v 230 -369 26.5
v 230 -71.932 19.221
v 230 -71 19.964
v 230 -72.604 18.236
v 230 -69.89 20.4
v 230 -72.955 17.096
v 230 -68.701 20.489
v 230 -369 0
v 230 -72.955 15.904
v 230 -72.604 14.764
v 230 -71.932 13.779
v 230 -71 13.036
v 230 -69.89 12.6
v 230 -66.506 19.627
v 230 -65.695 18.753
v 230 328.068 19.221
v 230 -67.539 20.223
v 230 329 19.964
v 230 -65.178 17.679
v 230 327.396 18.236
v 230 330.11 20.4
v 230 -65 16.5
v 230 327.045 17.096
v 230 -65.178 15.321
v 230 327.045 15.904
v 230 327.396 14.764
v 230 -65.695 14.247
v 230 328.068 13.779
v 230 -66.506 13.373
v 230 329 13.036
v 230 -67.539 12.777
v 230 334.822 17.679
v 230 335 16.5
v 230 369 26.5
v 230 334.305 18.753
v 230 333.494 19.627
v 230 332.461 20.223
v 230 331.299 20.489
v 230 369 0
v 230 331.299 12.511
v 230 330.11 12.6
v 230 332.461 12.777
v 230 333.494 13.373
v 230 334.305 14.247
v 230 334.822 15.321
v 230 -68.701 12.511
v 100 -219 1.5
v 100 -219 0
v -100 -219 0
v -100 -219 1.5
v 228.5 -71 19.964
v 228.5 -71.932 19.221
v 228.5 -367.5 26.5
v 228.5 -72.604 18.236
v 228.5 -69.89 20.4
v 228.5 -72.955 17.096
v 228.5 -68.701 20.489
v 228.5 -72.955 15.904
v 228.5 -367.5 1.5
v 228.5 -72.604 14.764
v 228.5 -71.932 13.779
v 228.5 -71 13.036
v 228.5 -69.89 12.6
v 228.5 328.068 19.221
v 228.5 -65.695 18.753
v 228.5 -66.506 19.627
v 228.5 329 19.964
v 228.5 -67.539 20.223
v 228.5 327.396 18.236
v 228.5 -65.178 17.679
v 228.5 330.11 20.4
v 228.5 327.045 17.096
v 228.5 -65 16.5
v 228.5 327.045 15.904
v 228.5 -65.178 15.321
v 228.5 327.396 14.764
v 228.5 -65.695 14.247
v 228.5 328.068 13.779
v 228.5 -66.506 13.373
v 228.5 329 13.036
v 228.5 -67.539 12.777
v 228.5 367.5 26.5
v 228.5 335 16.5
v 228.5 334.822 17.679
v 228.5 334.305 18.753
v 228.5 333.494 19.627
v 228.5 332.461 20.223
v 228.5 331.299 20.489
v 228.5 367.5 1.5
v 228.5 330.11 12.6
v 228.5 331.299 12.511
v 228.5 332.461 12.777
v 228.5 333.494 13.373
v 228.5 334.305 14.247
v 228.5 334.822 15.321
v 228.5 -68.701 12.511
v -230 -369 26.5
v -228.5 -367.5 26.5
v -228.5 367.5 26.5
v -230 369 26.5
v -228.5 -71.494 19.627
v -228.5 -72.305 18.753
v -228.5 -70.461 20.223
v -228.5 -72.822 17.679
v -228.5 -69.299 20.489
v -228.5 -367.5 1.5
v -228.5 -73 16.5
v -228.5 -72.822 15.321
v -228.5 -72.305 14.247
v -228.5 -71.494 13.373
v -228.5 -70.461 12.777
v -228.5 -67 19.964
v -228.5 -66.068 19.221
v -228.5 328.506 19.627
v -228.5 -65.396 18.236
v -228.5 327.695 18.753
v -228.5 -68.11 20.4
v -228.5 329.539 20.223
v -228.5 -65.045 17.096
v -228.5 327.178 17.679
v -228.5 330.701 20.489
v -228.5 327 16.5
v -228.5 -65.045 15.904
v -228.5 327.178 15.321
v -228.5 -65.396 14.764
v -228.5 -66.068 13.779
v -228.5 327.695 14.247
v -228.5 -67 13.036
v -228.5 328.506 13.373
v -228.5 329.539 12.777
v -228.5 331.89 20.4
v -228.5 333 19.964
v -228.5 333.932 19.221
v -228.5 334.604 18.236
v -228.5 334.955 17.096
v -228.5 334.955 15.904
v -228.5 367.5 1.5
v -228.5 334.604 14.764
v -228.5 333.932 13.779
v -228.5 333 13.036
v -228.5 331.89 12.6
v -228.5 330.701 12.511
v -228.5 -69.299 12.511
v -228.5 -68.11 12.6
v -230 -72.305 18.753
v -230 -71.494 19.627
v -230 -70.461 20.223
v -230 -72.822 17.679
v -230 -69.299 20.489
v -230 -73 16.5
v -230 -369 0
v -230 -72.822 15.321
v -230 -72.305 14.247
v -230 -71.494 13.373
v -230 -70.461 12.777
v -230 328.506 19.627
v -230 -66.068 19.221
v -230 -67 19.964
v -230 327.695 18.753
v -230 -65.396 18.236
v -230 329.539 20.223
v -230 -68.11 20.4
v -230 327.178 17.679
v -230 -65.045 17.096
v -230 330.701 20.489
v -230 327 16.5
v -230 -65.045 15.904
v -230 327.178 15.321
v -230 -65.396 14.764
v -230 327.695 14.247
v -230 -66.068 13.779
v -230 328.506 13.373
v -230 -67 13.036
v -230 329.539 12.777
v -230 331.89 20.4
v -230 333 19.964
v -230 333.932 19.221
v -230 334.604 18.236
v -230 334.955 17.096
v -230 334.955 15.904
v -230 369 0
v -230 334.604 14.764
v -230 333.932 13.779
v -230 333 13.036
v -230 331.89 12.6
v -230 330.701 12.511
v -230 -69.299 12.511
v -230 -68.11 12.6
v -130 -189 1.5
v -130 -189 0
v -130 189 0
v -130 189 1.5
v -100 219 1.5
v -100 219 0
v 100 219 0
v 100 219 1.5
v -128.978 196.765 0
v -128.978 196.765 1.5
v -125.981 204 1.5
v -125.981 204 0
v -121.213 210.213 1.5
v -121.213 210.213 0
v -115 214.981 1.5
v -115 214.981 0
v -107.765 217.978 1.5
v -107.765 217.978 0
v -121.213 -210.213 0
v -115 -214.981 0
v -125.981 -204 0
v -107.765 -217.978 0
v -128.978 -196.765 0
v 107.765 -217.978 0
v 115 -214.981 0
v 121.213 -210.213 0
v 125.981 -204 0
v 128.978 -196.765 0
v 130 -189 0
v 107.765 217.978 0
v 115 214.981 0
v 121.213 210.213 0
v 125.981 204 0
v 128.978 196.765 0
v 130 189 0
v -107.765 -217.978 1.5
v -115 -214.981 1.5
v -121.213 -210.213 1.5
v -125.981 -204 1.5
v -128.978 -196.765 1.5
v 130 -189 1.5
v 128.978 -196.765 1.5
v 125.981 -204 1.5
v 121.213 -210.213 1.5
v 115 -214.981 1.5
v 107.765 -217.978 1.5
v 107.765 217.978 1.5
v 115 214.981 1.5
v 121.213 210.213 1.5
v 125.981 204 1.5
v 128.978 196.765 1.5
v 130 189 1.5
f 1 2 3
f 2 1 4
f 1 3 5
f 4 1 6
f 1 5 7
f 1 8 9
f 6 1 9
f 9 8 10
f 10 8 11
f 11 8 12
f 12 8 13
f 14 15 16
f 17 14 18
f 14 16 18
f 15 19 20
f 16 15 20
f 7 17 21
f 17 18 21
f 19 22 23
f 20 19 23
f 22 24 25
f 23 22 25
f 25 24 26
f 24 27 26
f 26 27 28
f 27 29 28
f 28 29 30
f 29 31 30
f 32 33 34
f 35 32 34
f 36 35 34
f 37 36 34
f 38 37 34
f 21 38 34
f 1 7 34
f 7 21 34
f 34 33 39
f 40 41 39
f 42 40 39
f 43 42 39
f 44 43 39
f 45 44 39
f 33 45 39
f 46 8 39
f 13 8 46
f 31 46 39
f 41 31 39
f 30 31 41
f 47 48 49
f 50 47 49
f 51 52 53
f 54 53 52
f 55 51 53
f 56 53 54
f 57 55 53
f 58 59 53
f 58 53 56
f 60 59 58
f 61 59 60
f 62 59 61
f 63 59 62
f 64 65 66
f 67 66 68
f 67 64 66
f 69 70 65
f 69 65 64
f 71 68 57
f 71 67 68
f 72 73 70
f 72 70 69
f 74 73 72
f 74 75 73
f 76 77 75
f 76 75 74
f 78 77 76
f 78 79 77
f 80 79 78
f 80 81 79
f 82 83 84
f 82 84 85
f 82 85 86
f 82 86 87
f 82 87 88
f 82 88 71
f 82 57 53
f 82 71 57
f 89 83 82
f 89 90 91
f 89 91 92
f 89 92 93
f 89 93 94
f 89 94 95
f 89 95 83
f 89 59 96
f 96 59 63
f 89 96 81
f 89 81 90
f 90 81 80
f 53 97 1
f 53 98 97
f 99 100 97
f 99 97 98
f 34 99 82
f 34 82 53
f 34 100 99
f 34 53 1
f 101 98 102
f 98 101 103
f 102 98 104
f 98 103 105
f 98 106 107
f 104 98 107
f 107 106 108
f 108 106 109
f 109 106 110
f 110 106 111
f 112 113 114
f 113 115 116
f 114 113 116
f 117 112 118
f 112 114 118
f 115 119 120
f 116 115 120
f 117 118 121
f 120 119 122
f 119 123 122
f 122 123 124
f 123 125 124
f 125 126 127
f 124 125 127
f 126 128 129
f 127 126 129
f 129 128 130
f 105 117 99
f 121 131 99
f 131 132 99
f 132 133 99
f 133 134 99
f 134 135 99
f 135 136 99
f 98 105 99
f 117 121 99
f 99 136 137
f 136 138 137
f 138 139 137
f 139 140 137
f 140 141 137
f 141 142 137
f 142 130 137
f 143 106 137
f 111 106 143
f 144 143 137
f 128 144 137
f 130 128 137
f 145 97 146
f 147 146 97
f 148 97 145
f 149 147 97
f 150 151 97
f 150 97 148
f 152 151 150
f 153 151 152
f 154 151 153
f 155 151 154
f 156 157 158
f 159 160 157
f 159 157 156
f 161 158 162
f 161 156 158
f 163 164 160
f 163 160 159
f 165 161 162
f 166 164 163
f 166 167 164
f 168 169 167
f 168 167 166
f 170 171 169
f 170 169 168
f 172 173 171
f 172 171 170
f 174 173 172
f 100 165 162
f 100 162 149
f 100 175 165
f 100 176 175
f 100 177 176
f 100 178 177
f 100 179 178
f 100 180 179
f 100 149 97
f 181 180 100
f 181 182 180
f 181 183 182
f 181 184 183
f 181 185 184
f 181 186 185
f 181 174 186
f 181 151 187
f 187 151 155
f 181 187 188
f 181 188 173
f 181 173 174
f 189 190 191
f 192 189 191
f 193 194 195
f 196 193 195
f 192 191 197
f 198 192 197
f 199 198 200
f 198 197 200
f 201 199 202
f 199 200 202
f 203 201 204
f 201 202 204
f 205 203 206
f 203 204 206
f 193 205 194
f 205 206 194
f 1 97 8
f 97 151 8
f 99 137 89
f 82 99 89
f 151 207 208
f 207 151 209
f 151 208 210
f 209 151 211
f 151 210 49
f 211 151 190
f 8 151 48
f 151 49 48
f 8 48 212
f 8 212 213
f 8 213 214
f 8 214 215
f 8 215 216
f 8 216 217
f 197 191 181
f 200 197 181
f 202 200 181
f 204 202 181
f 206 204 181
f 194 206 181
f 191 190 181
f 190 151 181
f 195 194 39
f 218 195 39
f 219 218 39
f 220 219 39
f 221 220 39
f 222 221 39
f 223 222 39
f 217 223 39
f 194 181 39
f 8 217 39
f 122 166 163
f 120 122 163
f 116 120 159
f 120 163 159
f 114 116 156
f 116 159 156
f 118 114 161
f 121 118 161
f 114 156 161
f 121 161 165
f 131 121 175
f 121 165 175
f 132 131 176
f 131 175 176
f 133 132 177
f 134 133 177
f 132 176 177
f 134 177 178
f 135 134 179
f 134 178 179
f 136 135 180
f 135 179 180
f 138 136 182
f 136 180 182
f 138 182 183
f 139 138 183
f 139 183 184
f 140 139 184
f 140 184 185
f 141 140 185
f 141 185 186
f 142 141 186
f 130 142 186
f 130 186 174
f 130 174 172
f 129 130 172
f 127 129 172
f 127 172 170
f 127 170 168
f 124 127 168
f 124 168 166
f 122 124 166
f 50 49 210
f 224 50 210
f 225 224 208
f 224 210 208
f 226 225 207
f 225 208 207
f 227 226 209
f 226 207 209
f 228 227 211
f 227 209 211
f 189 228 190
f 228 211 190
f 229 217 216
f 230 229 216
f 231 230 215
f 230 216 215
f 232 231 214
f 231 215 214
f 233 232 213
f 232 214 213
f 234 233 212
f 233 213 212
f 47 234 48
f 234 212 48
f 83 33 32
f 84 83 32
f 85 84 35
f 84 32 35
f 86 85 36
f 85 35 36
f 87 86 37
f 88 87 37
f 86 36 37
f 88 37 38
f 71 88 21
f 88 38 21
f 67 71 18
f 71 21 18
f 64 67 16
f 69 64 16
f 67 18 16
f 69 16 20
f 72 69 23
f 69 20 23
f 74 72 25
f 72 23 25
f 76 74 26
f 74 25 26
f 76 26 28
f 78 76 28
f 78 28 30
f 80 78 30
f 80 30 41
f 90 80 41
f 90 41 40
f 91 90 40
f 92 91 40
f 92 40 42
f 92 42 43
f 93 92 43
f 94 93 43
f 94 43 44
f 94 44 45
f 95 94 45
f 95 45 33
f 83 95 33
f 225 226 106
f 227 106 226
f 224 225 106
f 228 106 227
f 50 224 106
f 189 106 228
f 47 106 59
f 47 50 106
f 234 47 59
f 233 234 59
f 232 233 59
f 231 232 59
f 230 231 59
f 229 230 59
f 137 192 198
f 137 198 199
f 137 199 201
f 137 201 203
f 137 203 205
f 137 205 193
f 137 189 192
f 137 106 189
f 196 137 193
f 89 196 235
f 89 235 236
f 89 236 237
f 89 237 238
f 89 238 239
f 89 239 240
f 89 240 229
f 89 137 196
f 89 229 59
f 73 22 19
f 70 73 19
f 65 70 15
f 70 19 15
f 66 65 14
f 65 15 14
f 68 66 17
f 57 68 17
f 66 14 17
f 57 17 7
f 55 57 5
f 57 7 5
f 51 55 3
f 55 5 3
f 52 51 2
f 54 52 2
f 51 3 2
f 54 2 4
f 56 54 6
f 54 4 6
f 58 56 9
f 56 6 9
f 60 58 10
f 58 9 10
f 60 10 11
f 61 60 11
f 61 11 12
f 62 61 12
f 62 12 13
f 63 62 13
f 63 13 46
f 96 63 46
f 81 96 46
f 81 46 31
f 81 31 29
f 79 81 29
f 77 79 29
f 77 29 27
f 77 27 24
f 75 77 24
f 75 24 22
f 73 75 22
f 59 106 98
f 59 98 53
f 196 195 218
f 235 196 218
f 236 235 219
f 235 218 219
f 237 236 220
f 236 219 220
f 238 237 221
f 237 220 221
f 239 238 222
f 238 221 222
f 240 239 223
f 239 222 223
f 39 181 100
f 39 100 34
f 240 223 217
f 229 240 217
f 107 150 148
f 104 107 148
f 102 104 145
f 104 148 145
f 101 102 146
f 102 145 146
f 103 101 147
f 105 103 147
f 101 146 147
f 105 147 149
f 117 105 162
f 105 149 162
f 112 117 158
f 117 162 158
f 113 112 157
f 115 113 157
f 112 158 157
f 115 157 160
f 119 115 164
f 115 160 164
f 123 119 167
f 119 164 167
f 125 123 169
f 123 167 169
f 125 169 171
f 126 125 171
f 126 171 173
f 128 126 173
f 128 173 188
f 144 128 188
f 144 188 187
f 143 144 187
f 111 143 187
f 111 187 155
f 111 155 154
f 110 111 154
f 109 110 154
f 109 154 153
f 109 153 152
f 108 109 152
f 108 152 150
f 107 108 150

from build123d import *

# Parameters (mm, degrees)
F0_W     = 460
F0_H     = 738
F1_DEPTH = 1.5
F2_W     = 460
F2_H     = 738
F2_W_2   = 457
F2_H_2   = 735
F3_DEPTH = 25
F4_R     = 4
F5_DEPTH = 25
F6_R     = 4
F7_DEPTH = 25


with BuildPart() as f1:
    # F0 (on Top) → F1 (new body)
    with BuildSketch(Plane.XY):
        Rectangle(F0_W, F0_H)
        with BuildLine():
            Line((-100, 219), (100, 219))
            ThreePointArc((100, 219), (121.213203, 210.213203), (130, 189))
            Line((130, 189), (130, -189))
            ThreePointArc((130, -189), (121.213203, -210.213203), (100, -219))
            Line((100, -219), (-100, -219))
            ThreePointArc((-100, -219), (-121.213203, -210.213203), (-130, -189))
            Line((-130, -189), (-130, 189))
            ThreePointArc((-130, 189), (-121.213203, 210.213203), (-100, 219))
        make_face(mode=Mode.SUBTRACT)
    extrude(amount=F1_DEPTH)

    # F2 (on face) → F3 (join)
    with BuildSketch(Plane.XY.offset(1.5)):
        Rectangle(F2_W, F2_H)
        Rectangle(F2_W_2, F2_H_2, mode=Mode.SUBTRACT)
    extrude(amount=F3_DEPTH)

    # F4 (on face) → F5 (cut)
    with BuildSketch(Plane.YZ.offset(230)):
        with Locations((-69, 16.5)):
            Circle(F4_R)
        with Locations((331, 16.5)):
            Circle(F4_R)
    extrude(amount=-F5_DEPTH, mode=Mode.SUBTRACT)

    # F6 (on face) → F7 (cut)
    with BuildSketch(Plane(origin=(-230, 0, 0), x_dir=(0, -1, 0), z_dir=(-1, 0, 0))):
        with Locations((-331, 16.5)):
            Circle(F6_R)
        with Locations((69, 16.5)):
            Circle(F6_R)
    extrude(amount=-F7_DEPTH, mode=Mode.SUBTRACT)


solid = f1.part
